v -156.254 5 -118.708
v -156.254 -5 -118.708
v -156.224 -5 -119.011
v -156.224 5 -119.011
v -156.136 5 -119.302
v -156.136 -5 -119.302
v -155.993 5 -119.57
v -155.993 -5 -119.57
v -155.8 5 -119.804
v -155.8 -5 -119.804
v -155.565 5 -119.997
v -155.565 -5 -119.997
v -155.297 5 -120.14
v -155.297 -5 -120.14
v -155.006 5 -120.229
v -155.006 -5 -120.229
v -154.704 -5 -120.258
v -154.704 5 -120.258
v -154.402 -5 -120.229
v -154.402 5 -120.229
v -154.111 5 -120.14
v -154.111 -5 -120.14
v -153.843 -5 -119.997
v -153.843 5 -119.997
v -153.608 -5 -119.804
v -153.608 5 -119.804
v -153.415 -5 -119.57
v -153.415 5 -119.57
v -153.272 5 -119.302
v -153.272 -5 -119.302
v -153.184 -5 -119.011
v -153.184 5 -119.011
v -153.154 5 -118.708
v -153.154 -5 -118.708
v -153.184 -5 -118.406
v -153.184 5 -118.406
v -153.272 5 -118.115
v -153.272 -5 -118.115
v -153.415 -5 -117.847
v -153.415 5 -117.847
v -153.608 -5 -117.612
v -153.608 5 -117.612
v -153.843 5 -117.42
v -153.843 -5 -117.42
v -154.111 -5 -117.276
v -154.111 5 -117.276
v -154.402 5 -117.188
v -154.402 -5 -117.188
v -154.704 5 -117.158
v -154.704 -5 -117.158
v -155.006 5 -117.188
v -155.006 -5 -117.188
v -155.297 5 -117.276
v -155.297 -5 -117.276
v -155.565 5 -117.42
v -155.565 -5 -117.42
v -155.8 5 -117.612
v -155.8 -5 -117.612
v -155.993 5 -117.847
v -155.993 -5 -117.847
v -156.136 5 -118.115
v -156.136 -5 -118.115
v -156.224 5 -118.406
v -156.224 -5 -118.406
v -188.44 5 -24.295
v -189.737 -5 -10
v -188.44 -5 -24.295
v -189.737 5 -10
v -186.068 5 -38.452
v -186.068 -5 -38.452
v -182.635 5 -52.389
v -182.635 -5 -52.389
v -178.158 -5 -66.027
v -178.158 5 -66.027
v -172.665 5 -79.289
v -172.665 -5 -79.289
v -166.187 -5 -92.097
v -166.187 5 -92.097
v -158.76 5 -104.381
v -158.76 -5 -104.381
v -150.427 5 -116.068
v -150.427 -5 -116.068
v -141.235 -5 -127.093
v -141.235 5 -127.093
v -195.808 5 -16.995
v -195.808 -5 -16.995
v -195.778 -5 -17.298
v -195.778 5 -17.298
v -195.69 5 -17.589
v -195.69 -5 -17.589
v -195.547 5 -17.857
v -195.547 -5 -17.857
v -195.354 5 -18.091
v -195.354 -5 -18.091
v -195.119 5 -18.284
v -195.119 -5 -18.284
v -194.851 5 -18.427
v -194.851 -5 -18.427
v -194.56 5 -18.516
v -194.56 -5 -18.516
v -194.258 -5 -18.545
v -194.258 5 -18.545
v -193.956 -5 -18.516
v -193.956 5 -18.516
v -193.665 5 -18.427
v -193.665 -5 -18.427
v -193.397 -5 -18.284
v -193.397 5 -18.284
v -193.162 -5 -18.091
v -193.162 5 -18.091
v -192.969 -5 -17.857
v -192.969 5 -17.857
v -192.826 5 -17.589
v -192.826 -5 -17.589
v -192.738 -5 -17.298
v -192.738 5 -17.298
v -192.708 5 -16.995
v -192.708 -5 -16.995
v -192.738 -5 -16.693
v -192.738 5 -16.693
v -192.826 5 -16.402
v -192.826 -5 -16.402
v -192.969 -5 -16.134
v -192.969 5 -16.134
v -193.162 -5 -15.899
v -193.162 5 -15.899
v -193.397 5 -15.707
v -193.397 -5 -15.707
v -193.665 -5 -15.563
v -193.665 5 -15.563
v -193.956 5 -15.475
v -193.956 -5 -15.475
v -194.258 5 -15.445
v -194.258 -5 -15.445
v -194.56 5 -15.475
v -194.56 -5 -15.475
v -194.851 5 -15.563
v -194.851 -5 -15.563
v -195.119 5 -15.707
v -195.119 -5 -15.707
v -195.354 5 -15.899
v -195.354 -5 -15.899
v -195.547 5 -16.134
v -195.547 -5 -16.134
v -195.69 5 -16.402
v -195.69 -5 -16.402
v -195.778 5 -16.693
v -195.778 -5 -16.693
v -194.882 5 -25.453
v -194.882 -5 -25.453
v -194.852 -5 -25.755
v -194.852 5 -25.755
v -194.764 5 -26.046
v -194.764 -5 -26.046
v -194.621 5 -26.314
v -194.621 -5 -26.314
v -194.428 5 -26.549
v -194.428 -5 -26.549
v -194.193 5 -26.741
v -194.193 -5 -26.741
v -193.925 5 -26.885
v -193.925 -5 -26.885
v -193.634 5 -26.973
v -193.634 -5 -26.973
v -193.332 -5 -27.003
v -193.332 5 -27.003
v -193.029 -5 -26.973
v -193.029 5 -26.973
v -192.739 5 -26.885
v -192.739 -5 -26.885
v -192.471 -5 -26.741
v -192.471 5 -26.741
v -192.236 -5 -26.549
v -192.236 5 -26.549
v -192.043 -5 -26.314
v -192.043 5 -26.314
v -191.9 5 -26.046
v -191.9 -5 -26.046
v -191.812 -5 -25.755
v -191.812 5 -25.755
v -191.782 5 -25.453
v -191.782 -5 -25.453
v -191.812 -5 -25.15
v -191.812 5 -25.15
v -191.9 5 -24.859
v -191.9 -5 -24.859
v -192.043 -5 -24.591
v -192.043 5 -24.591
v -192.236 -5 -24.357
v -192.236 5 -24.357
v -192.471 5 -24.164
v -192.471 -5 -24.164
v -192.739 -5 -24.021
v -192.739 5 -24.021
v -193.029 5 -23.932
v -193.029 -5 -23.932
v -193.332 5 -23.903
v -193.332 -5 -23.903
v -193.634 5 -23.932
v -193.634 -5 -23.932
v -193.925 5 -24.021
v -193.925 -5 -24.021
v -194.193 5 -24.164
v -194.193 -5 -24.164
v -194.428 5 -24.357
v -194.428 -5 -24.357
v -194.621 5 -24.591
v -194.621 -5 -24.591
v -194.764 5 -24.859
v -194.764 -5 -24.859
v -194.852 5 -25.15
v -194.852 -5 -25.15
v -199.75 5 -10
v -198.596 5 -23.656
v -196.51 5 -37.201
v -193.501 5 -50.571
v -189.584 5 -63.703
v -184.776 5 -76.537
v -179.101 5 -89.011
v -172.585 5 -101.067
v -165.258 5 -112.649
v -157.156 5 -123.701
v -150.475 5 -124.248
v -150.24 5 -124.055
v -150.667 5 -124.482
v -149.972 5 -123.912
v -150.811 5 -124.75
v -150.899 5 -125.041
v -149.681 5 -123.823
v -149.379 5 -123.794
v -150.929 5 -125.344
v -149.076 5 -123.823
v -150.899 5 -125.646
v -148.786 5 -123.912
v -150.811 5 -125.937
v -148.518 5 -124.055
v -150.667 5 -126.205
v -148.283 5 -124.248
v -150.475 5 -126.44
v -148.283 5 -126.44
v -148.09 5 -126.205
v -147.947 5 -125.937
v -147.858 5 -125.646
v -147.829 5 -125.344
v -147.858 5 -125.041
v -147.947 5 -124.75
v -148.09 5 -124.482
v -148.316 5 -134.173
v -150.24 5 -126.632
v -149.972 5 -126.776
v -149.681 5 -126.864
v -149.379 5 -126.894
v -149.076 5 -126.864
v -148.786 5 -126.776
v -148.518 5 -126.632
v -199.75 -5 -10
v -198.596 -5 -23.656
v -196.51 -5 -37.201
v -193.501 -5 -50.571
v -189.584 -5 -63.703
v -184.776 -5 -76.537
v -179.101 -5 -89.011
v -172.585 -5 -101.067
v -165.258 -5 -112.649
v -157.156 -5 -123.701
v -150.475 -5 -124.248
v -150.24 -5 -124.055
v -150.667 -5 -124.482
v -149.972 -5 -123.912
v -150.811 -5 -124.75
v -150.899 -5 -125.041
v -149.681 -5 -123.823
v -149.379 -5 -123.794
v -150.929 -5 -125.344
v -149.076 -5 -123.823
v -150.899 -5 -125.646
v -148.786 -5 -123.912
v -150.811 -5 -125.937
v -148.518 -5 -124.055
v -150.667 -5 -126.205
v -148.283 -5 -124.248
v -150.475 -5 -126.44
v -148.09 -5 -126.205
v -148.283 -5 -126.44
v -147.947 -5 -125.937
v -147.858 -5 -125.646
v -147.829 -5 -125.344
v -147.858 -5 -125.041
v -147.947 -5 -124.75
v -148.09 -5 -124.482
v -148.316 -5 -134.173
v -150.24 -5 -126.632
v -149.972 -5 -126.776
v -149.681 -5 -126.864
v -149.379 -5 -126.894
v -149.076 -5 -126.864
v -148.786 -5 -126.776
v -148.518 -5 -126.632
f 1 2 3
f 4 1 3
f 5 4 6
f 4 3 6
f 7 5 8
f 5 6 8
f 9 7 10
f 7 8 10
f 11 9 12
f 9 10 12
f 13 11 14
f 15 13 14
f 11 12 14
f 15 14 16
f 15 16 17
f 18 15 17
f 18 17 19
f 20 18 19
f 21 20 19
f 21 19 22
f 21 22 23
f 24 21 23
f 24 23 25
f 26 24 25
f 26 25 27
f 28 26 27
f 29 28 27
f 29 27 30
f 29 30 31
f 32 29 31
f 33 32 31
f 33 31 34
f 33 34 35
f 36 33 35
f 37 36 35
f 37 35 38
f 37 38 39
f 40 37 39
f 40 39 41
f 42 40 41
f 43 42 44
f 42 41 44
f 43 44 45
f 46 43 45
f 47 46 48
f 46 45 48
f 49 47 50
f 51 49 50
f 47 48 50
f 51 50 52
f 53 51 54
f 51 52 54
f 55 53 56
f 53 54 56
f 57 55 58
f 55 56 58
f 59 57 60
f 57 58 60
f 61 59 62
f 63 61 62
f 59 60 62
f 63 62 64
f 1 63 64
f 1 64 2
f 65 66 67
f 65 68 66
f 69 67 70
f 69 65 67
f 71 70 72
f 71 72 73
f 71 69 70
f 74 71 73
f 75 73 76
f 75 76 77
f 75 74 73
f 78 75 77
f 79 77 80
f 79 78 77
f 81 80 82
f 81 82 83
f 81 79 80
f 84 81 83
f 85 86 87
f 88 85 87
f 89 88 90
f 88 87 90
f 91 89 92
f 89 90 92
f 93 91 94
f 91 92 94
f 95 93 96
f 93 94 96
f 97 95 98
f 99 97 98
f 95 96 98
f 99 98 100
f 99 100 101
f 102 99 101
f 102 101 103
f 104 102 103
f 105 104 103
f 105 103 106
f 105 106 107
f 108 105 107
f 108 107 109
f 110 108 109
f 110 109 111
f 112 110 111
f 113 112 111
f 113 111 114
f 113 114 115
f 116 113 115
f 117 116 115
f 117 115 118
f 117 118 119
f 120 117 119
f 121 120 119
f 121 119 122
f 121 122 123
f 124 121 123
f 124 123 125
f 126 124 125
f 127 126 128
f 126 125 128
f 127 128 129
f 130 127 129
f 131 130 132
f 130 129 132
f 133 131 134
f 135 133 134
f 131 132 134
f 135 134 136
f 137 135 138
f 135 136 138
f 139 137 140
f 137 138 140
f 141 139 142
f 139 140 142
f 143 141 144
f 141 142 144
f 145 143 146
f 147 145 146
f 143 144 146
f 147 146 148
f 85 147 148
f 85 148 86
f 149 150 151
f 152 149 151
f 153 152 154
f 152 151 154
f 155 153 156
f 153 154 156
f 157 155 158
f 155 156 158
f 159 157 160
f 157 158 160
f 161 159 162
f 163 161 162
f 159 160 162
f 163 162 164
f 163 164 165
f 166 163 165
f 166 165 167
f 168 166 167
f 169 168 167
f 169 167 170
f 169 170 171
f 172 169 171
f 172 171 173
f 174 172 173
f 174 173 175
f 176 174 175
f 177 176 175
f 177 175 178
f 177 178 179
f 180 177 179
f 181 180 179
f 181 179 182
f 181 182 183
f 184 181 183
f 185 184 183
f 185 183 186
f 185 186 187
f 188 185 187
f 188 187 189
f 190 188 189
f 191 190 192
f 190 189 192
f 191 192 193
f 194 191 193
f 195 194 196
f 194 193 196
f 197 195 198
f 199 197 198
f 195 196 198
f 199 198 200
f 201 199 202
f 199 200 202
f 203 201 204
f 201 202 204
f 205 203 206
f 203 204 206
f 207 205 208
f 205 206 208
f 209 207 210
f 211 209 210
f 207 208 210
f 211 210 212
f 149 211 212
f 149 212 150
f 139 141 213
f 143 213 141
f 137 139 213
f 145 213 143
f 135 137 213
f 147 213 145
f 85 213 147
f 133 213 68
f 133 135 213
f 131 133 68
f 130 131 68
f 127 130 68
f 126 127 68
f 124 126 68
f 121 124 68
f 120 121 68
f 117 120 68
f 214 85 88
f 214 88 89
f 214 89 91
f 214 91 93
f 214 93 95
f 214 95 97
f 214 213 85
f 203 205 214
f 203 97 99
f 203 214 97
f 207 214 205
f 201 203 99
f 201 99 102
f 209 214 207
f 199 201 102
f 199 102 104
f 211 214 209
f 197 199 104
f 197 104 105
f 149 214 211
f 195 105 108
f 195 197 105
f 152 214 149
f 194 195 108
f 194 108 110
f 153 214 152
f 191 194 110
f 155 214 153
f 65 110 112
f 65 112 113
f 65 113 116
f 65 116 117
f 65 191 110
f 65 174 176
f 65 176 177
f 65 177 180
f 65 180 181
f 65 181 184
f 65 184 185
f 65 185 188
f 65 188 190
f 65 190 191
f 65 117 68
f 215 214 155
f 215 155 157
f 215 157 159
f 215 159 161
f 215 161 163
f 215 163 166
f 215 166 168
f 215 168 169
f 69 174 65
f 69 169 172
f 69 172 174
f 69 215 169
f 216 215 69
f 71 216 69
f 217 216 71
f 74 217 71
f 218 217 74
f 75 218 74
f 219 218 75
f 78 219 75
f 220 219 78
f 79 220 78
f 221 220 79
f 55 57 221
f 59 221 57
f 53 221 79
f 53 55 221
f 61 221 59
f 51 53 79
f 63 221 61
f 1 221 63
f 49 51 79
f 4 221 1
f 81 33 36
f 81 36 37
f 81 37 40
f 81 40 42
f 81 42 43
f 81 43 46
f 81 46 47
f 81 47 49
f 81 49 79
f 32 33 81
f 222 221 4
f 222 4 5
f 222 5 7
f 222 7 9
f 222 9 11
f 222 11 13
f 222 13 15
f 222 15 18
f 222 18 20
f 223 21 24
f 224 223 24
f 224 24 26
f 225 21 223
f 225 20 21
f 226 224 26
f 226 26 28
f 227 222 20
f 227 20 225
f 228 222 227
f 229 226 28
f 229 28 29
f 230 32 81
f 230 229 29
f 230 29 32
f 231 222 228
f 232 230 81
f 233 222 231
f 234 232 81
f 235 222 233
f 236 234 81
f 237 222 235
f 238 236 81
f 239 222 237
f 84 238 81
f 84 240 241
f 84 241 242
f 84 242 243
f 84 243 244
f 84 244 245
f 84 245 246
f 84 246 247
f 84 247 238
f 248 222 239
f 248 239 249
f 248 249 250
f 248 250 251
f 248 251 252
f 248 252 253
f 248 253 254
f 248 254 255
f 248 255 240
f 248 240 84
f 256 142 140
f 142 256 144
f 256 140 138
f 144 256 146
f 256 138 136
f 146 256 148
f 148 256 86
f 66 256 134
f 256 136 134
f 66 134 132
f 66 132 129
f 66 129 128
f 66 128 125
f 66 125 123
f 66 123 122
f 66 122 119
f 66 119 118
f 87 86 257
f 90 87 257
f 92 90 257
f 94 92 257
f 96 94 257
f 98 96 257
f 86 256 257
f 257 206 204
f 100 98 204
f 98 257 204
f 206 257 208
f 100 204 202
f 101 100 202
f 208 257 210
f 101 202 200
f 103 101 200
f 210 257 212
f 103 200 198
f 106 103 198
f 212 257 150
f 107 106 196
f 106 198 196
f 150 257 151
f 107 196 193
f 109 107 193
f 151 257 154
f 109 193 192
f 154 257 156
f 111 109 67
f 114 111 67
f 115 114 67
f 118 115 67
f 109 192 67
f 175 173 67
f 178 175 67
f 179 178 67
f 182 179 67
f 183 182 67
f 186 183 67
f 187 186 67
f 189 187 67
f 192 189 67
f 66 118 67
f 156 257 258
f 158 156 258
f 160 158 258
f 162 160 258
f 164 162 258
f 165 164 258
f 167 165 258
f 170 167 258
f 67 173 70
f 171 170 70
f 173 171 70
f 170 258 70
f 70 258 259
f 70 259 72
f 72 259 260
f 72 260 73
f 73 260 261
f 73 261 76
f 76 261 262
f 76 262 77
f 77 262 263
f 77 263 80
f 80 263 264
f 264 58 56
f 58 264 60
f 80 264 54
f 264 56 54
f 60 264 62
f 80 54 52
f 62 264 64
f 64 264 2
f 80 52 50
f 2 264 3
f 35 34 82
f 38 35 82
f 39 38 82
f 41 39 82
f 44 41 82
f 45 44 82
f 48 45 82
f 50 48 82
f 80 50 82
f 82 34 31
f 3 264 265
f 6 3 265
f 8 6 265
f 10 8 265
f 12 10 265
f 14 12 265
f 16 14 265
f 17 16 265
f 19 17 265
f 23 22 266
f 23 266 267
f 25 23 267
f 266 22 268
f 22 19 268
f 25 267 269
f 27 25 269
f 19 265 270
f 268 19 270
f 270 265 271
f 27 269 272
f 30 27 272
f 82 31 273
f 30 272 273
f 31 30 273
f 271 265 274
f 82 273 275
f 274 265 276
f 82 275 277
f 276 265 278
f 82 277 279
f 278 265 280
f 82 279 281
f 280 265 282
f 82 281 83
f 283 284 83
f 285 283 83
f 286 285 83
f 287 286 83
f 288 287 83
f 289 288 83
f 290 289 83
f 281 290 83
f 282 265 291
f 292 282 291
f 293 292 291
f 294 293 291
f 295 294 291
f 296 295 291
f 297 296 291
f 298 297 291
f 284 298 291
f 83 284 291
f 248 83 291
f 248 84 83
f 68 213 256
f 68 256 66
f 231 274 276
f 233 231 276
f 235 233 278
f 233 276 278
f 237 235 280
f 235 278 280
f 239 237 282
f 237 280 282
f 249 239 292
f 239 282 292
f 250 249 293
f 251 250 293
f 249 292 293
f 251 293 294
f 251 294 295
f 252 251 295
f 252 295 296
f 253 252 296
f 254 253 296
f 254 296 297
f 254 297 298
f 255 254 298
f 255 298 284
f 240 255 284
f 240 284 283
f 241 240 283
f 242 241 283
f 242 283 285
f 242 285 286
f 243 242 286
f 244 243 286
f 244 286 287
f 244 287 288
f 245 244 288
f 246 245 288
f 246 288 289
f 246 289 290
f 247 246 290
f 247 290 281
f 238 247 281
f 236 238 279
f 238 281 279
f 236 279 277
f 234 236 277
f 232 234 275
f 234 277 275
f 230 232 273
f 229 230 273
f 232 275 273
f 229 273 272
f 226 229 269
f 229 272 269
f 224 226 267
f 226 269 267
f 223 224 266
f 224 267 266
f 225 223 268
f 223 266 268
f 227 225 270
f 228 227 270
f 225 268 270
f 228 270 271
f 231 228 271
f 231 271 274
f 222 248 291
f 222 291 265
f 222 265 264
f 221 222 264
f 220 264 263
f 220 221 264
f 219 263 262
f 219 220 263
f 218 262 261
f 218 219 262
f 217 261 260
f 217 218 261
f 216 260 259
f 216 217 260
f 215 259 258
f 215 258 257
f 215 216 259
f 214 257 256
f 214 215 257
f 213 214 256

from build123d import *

# Parameters (mm, degrees)
BASE_DEPTH                 = 5
F_3_1_3_1_DIAMETER_HOLE1_D = 3.1


with BuildPart() as part:
    # Sketch1 → base (new, symmetric)
    with BuildSketch(Plane(origin=(0, 0, 0), x_dir=(1, 0, 0), z_dir=(0, 1, 0))):
        with BuildLine():
            Line((-141.235146462, 127.093010838), (-148.31553673, 134.173401106))
            ThreePointArc((-148.31553673, 134.173401106), (-184.775906502, 76.536686473), (-199.749843554, 10))
            Line((-199.749843554, 10), (-189.73665961, 10))
            ThreePointArc((-189.73665961, 10), (-175.537111177, 72.709852149), (-141.235146462, 127.093010838))
        make_face()
    extrude(amount=BASE_DEPTH, both=True)

    # Ø3.1 (3.1) Diameter Hole1 (through all)
    with Locations(Plane(origin=(0, 5, 0), x_dir=(1, 0, 0), z_dir=(0, 1, 0))):
        with Locations((-194.257966128, 16.995369836), (-149.378666408, 125.343583889), (-154.703901357, 118.708478657), (-193.331747968, 25.452607483)):
            Hole(F_3_1_3_1_DIAMETER_HOLE1_D / 2)


solid = part.part
